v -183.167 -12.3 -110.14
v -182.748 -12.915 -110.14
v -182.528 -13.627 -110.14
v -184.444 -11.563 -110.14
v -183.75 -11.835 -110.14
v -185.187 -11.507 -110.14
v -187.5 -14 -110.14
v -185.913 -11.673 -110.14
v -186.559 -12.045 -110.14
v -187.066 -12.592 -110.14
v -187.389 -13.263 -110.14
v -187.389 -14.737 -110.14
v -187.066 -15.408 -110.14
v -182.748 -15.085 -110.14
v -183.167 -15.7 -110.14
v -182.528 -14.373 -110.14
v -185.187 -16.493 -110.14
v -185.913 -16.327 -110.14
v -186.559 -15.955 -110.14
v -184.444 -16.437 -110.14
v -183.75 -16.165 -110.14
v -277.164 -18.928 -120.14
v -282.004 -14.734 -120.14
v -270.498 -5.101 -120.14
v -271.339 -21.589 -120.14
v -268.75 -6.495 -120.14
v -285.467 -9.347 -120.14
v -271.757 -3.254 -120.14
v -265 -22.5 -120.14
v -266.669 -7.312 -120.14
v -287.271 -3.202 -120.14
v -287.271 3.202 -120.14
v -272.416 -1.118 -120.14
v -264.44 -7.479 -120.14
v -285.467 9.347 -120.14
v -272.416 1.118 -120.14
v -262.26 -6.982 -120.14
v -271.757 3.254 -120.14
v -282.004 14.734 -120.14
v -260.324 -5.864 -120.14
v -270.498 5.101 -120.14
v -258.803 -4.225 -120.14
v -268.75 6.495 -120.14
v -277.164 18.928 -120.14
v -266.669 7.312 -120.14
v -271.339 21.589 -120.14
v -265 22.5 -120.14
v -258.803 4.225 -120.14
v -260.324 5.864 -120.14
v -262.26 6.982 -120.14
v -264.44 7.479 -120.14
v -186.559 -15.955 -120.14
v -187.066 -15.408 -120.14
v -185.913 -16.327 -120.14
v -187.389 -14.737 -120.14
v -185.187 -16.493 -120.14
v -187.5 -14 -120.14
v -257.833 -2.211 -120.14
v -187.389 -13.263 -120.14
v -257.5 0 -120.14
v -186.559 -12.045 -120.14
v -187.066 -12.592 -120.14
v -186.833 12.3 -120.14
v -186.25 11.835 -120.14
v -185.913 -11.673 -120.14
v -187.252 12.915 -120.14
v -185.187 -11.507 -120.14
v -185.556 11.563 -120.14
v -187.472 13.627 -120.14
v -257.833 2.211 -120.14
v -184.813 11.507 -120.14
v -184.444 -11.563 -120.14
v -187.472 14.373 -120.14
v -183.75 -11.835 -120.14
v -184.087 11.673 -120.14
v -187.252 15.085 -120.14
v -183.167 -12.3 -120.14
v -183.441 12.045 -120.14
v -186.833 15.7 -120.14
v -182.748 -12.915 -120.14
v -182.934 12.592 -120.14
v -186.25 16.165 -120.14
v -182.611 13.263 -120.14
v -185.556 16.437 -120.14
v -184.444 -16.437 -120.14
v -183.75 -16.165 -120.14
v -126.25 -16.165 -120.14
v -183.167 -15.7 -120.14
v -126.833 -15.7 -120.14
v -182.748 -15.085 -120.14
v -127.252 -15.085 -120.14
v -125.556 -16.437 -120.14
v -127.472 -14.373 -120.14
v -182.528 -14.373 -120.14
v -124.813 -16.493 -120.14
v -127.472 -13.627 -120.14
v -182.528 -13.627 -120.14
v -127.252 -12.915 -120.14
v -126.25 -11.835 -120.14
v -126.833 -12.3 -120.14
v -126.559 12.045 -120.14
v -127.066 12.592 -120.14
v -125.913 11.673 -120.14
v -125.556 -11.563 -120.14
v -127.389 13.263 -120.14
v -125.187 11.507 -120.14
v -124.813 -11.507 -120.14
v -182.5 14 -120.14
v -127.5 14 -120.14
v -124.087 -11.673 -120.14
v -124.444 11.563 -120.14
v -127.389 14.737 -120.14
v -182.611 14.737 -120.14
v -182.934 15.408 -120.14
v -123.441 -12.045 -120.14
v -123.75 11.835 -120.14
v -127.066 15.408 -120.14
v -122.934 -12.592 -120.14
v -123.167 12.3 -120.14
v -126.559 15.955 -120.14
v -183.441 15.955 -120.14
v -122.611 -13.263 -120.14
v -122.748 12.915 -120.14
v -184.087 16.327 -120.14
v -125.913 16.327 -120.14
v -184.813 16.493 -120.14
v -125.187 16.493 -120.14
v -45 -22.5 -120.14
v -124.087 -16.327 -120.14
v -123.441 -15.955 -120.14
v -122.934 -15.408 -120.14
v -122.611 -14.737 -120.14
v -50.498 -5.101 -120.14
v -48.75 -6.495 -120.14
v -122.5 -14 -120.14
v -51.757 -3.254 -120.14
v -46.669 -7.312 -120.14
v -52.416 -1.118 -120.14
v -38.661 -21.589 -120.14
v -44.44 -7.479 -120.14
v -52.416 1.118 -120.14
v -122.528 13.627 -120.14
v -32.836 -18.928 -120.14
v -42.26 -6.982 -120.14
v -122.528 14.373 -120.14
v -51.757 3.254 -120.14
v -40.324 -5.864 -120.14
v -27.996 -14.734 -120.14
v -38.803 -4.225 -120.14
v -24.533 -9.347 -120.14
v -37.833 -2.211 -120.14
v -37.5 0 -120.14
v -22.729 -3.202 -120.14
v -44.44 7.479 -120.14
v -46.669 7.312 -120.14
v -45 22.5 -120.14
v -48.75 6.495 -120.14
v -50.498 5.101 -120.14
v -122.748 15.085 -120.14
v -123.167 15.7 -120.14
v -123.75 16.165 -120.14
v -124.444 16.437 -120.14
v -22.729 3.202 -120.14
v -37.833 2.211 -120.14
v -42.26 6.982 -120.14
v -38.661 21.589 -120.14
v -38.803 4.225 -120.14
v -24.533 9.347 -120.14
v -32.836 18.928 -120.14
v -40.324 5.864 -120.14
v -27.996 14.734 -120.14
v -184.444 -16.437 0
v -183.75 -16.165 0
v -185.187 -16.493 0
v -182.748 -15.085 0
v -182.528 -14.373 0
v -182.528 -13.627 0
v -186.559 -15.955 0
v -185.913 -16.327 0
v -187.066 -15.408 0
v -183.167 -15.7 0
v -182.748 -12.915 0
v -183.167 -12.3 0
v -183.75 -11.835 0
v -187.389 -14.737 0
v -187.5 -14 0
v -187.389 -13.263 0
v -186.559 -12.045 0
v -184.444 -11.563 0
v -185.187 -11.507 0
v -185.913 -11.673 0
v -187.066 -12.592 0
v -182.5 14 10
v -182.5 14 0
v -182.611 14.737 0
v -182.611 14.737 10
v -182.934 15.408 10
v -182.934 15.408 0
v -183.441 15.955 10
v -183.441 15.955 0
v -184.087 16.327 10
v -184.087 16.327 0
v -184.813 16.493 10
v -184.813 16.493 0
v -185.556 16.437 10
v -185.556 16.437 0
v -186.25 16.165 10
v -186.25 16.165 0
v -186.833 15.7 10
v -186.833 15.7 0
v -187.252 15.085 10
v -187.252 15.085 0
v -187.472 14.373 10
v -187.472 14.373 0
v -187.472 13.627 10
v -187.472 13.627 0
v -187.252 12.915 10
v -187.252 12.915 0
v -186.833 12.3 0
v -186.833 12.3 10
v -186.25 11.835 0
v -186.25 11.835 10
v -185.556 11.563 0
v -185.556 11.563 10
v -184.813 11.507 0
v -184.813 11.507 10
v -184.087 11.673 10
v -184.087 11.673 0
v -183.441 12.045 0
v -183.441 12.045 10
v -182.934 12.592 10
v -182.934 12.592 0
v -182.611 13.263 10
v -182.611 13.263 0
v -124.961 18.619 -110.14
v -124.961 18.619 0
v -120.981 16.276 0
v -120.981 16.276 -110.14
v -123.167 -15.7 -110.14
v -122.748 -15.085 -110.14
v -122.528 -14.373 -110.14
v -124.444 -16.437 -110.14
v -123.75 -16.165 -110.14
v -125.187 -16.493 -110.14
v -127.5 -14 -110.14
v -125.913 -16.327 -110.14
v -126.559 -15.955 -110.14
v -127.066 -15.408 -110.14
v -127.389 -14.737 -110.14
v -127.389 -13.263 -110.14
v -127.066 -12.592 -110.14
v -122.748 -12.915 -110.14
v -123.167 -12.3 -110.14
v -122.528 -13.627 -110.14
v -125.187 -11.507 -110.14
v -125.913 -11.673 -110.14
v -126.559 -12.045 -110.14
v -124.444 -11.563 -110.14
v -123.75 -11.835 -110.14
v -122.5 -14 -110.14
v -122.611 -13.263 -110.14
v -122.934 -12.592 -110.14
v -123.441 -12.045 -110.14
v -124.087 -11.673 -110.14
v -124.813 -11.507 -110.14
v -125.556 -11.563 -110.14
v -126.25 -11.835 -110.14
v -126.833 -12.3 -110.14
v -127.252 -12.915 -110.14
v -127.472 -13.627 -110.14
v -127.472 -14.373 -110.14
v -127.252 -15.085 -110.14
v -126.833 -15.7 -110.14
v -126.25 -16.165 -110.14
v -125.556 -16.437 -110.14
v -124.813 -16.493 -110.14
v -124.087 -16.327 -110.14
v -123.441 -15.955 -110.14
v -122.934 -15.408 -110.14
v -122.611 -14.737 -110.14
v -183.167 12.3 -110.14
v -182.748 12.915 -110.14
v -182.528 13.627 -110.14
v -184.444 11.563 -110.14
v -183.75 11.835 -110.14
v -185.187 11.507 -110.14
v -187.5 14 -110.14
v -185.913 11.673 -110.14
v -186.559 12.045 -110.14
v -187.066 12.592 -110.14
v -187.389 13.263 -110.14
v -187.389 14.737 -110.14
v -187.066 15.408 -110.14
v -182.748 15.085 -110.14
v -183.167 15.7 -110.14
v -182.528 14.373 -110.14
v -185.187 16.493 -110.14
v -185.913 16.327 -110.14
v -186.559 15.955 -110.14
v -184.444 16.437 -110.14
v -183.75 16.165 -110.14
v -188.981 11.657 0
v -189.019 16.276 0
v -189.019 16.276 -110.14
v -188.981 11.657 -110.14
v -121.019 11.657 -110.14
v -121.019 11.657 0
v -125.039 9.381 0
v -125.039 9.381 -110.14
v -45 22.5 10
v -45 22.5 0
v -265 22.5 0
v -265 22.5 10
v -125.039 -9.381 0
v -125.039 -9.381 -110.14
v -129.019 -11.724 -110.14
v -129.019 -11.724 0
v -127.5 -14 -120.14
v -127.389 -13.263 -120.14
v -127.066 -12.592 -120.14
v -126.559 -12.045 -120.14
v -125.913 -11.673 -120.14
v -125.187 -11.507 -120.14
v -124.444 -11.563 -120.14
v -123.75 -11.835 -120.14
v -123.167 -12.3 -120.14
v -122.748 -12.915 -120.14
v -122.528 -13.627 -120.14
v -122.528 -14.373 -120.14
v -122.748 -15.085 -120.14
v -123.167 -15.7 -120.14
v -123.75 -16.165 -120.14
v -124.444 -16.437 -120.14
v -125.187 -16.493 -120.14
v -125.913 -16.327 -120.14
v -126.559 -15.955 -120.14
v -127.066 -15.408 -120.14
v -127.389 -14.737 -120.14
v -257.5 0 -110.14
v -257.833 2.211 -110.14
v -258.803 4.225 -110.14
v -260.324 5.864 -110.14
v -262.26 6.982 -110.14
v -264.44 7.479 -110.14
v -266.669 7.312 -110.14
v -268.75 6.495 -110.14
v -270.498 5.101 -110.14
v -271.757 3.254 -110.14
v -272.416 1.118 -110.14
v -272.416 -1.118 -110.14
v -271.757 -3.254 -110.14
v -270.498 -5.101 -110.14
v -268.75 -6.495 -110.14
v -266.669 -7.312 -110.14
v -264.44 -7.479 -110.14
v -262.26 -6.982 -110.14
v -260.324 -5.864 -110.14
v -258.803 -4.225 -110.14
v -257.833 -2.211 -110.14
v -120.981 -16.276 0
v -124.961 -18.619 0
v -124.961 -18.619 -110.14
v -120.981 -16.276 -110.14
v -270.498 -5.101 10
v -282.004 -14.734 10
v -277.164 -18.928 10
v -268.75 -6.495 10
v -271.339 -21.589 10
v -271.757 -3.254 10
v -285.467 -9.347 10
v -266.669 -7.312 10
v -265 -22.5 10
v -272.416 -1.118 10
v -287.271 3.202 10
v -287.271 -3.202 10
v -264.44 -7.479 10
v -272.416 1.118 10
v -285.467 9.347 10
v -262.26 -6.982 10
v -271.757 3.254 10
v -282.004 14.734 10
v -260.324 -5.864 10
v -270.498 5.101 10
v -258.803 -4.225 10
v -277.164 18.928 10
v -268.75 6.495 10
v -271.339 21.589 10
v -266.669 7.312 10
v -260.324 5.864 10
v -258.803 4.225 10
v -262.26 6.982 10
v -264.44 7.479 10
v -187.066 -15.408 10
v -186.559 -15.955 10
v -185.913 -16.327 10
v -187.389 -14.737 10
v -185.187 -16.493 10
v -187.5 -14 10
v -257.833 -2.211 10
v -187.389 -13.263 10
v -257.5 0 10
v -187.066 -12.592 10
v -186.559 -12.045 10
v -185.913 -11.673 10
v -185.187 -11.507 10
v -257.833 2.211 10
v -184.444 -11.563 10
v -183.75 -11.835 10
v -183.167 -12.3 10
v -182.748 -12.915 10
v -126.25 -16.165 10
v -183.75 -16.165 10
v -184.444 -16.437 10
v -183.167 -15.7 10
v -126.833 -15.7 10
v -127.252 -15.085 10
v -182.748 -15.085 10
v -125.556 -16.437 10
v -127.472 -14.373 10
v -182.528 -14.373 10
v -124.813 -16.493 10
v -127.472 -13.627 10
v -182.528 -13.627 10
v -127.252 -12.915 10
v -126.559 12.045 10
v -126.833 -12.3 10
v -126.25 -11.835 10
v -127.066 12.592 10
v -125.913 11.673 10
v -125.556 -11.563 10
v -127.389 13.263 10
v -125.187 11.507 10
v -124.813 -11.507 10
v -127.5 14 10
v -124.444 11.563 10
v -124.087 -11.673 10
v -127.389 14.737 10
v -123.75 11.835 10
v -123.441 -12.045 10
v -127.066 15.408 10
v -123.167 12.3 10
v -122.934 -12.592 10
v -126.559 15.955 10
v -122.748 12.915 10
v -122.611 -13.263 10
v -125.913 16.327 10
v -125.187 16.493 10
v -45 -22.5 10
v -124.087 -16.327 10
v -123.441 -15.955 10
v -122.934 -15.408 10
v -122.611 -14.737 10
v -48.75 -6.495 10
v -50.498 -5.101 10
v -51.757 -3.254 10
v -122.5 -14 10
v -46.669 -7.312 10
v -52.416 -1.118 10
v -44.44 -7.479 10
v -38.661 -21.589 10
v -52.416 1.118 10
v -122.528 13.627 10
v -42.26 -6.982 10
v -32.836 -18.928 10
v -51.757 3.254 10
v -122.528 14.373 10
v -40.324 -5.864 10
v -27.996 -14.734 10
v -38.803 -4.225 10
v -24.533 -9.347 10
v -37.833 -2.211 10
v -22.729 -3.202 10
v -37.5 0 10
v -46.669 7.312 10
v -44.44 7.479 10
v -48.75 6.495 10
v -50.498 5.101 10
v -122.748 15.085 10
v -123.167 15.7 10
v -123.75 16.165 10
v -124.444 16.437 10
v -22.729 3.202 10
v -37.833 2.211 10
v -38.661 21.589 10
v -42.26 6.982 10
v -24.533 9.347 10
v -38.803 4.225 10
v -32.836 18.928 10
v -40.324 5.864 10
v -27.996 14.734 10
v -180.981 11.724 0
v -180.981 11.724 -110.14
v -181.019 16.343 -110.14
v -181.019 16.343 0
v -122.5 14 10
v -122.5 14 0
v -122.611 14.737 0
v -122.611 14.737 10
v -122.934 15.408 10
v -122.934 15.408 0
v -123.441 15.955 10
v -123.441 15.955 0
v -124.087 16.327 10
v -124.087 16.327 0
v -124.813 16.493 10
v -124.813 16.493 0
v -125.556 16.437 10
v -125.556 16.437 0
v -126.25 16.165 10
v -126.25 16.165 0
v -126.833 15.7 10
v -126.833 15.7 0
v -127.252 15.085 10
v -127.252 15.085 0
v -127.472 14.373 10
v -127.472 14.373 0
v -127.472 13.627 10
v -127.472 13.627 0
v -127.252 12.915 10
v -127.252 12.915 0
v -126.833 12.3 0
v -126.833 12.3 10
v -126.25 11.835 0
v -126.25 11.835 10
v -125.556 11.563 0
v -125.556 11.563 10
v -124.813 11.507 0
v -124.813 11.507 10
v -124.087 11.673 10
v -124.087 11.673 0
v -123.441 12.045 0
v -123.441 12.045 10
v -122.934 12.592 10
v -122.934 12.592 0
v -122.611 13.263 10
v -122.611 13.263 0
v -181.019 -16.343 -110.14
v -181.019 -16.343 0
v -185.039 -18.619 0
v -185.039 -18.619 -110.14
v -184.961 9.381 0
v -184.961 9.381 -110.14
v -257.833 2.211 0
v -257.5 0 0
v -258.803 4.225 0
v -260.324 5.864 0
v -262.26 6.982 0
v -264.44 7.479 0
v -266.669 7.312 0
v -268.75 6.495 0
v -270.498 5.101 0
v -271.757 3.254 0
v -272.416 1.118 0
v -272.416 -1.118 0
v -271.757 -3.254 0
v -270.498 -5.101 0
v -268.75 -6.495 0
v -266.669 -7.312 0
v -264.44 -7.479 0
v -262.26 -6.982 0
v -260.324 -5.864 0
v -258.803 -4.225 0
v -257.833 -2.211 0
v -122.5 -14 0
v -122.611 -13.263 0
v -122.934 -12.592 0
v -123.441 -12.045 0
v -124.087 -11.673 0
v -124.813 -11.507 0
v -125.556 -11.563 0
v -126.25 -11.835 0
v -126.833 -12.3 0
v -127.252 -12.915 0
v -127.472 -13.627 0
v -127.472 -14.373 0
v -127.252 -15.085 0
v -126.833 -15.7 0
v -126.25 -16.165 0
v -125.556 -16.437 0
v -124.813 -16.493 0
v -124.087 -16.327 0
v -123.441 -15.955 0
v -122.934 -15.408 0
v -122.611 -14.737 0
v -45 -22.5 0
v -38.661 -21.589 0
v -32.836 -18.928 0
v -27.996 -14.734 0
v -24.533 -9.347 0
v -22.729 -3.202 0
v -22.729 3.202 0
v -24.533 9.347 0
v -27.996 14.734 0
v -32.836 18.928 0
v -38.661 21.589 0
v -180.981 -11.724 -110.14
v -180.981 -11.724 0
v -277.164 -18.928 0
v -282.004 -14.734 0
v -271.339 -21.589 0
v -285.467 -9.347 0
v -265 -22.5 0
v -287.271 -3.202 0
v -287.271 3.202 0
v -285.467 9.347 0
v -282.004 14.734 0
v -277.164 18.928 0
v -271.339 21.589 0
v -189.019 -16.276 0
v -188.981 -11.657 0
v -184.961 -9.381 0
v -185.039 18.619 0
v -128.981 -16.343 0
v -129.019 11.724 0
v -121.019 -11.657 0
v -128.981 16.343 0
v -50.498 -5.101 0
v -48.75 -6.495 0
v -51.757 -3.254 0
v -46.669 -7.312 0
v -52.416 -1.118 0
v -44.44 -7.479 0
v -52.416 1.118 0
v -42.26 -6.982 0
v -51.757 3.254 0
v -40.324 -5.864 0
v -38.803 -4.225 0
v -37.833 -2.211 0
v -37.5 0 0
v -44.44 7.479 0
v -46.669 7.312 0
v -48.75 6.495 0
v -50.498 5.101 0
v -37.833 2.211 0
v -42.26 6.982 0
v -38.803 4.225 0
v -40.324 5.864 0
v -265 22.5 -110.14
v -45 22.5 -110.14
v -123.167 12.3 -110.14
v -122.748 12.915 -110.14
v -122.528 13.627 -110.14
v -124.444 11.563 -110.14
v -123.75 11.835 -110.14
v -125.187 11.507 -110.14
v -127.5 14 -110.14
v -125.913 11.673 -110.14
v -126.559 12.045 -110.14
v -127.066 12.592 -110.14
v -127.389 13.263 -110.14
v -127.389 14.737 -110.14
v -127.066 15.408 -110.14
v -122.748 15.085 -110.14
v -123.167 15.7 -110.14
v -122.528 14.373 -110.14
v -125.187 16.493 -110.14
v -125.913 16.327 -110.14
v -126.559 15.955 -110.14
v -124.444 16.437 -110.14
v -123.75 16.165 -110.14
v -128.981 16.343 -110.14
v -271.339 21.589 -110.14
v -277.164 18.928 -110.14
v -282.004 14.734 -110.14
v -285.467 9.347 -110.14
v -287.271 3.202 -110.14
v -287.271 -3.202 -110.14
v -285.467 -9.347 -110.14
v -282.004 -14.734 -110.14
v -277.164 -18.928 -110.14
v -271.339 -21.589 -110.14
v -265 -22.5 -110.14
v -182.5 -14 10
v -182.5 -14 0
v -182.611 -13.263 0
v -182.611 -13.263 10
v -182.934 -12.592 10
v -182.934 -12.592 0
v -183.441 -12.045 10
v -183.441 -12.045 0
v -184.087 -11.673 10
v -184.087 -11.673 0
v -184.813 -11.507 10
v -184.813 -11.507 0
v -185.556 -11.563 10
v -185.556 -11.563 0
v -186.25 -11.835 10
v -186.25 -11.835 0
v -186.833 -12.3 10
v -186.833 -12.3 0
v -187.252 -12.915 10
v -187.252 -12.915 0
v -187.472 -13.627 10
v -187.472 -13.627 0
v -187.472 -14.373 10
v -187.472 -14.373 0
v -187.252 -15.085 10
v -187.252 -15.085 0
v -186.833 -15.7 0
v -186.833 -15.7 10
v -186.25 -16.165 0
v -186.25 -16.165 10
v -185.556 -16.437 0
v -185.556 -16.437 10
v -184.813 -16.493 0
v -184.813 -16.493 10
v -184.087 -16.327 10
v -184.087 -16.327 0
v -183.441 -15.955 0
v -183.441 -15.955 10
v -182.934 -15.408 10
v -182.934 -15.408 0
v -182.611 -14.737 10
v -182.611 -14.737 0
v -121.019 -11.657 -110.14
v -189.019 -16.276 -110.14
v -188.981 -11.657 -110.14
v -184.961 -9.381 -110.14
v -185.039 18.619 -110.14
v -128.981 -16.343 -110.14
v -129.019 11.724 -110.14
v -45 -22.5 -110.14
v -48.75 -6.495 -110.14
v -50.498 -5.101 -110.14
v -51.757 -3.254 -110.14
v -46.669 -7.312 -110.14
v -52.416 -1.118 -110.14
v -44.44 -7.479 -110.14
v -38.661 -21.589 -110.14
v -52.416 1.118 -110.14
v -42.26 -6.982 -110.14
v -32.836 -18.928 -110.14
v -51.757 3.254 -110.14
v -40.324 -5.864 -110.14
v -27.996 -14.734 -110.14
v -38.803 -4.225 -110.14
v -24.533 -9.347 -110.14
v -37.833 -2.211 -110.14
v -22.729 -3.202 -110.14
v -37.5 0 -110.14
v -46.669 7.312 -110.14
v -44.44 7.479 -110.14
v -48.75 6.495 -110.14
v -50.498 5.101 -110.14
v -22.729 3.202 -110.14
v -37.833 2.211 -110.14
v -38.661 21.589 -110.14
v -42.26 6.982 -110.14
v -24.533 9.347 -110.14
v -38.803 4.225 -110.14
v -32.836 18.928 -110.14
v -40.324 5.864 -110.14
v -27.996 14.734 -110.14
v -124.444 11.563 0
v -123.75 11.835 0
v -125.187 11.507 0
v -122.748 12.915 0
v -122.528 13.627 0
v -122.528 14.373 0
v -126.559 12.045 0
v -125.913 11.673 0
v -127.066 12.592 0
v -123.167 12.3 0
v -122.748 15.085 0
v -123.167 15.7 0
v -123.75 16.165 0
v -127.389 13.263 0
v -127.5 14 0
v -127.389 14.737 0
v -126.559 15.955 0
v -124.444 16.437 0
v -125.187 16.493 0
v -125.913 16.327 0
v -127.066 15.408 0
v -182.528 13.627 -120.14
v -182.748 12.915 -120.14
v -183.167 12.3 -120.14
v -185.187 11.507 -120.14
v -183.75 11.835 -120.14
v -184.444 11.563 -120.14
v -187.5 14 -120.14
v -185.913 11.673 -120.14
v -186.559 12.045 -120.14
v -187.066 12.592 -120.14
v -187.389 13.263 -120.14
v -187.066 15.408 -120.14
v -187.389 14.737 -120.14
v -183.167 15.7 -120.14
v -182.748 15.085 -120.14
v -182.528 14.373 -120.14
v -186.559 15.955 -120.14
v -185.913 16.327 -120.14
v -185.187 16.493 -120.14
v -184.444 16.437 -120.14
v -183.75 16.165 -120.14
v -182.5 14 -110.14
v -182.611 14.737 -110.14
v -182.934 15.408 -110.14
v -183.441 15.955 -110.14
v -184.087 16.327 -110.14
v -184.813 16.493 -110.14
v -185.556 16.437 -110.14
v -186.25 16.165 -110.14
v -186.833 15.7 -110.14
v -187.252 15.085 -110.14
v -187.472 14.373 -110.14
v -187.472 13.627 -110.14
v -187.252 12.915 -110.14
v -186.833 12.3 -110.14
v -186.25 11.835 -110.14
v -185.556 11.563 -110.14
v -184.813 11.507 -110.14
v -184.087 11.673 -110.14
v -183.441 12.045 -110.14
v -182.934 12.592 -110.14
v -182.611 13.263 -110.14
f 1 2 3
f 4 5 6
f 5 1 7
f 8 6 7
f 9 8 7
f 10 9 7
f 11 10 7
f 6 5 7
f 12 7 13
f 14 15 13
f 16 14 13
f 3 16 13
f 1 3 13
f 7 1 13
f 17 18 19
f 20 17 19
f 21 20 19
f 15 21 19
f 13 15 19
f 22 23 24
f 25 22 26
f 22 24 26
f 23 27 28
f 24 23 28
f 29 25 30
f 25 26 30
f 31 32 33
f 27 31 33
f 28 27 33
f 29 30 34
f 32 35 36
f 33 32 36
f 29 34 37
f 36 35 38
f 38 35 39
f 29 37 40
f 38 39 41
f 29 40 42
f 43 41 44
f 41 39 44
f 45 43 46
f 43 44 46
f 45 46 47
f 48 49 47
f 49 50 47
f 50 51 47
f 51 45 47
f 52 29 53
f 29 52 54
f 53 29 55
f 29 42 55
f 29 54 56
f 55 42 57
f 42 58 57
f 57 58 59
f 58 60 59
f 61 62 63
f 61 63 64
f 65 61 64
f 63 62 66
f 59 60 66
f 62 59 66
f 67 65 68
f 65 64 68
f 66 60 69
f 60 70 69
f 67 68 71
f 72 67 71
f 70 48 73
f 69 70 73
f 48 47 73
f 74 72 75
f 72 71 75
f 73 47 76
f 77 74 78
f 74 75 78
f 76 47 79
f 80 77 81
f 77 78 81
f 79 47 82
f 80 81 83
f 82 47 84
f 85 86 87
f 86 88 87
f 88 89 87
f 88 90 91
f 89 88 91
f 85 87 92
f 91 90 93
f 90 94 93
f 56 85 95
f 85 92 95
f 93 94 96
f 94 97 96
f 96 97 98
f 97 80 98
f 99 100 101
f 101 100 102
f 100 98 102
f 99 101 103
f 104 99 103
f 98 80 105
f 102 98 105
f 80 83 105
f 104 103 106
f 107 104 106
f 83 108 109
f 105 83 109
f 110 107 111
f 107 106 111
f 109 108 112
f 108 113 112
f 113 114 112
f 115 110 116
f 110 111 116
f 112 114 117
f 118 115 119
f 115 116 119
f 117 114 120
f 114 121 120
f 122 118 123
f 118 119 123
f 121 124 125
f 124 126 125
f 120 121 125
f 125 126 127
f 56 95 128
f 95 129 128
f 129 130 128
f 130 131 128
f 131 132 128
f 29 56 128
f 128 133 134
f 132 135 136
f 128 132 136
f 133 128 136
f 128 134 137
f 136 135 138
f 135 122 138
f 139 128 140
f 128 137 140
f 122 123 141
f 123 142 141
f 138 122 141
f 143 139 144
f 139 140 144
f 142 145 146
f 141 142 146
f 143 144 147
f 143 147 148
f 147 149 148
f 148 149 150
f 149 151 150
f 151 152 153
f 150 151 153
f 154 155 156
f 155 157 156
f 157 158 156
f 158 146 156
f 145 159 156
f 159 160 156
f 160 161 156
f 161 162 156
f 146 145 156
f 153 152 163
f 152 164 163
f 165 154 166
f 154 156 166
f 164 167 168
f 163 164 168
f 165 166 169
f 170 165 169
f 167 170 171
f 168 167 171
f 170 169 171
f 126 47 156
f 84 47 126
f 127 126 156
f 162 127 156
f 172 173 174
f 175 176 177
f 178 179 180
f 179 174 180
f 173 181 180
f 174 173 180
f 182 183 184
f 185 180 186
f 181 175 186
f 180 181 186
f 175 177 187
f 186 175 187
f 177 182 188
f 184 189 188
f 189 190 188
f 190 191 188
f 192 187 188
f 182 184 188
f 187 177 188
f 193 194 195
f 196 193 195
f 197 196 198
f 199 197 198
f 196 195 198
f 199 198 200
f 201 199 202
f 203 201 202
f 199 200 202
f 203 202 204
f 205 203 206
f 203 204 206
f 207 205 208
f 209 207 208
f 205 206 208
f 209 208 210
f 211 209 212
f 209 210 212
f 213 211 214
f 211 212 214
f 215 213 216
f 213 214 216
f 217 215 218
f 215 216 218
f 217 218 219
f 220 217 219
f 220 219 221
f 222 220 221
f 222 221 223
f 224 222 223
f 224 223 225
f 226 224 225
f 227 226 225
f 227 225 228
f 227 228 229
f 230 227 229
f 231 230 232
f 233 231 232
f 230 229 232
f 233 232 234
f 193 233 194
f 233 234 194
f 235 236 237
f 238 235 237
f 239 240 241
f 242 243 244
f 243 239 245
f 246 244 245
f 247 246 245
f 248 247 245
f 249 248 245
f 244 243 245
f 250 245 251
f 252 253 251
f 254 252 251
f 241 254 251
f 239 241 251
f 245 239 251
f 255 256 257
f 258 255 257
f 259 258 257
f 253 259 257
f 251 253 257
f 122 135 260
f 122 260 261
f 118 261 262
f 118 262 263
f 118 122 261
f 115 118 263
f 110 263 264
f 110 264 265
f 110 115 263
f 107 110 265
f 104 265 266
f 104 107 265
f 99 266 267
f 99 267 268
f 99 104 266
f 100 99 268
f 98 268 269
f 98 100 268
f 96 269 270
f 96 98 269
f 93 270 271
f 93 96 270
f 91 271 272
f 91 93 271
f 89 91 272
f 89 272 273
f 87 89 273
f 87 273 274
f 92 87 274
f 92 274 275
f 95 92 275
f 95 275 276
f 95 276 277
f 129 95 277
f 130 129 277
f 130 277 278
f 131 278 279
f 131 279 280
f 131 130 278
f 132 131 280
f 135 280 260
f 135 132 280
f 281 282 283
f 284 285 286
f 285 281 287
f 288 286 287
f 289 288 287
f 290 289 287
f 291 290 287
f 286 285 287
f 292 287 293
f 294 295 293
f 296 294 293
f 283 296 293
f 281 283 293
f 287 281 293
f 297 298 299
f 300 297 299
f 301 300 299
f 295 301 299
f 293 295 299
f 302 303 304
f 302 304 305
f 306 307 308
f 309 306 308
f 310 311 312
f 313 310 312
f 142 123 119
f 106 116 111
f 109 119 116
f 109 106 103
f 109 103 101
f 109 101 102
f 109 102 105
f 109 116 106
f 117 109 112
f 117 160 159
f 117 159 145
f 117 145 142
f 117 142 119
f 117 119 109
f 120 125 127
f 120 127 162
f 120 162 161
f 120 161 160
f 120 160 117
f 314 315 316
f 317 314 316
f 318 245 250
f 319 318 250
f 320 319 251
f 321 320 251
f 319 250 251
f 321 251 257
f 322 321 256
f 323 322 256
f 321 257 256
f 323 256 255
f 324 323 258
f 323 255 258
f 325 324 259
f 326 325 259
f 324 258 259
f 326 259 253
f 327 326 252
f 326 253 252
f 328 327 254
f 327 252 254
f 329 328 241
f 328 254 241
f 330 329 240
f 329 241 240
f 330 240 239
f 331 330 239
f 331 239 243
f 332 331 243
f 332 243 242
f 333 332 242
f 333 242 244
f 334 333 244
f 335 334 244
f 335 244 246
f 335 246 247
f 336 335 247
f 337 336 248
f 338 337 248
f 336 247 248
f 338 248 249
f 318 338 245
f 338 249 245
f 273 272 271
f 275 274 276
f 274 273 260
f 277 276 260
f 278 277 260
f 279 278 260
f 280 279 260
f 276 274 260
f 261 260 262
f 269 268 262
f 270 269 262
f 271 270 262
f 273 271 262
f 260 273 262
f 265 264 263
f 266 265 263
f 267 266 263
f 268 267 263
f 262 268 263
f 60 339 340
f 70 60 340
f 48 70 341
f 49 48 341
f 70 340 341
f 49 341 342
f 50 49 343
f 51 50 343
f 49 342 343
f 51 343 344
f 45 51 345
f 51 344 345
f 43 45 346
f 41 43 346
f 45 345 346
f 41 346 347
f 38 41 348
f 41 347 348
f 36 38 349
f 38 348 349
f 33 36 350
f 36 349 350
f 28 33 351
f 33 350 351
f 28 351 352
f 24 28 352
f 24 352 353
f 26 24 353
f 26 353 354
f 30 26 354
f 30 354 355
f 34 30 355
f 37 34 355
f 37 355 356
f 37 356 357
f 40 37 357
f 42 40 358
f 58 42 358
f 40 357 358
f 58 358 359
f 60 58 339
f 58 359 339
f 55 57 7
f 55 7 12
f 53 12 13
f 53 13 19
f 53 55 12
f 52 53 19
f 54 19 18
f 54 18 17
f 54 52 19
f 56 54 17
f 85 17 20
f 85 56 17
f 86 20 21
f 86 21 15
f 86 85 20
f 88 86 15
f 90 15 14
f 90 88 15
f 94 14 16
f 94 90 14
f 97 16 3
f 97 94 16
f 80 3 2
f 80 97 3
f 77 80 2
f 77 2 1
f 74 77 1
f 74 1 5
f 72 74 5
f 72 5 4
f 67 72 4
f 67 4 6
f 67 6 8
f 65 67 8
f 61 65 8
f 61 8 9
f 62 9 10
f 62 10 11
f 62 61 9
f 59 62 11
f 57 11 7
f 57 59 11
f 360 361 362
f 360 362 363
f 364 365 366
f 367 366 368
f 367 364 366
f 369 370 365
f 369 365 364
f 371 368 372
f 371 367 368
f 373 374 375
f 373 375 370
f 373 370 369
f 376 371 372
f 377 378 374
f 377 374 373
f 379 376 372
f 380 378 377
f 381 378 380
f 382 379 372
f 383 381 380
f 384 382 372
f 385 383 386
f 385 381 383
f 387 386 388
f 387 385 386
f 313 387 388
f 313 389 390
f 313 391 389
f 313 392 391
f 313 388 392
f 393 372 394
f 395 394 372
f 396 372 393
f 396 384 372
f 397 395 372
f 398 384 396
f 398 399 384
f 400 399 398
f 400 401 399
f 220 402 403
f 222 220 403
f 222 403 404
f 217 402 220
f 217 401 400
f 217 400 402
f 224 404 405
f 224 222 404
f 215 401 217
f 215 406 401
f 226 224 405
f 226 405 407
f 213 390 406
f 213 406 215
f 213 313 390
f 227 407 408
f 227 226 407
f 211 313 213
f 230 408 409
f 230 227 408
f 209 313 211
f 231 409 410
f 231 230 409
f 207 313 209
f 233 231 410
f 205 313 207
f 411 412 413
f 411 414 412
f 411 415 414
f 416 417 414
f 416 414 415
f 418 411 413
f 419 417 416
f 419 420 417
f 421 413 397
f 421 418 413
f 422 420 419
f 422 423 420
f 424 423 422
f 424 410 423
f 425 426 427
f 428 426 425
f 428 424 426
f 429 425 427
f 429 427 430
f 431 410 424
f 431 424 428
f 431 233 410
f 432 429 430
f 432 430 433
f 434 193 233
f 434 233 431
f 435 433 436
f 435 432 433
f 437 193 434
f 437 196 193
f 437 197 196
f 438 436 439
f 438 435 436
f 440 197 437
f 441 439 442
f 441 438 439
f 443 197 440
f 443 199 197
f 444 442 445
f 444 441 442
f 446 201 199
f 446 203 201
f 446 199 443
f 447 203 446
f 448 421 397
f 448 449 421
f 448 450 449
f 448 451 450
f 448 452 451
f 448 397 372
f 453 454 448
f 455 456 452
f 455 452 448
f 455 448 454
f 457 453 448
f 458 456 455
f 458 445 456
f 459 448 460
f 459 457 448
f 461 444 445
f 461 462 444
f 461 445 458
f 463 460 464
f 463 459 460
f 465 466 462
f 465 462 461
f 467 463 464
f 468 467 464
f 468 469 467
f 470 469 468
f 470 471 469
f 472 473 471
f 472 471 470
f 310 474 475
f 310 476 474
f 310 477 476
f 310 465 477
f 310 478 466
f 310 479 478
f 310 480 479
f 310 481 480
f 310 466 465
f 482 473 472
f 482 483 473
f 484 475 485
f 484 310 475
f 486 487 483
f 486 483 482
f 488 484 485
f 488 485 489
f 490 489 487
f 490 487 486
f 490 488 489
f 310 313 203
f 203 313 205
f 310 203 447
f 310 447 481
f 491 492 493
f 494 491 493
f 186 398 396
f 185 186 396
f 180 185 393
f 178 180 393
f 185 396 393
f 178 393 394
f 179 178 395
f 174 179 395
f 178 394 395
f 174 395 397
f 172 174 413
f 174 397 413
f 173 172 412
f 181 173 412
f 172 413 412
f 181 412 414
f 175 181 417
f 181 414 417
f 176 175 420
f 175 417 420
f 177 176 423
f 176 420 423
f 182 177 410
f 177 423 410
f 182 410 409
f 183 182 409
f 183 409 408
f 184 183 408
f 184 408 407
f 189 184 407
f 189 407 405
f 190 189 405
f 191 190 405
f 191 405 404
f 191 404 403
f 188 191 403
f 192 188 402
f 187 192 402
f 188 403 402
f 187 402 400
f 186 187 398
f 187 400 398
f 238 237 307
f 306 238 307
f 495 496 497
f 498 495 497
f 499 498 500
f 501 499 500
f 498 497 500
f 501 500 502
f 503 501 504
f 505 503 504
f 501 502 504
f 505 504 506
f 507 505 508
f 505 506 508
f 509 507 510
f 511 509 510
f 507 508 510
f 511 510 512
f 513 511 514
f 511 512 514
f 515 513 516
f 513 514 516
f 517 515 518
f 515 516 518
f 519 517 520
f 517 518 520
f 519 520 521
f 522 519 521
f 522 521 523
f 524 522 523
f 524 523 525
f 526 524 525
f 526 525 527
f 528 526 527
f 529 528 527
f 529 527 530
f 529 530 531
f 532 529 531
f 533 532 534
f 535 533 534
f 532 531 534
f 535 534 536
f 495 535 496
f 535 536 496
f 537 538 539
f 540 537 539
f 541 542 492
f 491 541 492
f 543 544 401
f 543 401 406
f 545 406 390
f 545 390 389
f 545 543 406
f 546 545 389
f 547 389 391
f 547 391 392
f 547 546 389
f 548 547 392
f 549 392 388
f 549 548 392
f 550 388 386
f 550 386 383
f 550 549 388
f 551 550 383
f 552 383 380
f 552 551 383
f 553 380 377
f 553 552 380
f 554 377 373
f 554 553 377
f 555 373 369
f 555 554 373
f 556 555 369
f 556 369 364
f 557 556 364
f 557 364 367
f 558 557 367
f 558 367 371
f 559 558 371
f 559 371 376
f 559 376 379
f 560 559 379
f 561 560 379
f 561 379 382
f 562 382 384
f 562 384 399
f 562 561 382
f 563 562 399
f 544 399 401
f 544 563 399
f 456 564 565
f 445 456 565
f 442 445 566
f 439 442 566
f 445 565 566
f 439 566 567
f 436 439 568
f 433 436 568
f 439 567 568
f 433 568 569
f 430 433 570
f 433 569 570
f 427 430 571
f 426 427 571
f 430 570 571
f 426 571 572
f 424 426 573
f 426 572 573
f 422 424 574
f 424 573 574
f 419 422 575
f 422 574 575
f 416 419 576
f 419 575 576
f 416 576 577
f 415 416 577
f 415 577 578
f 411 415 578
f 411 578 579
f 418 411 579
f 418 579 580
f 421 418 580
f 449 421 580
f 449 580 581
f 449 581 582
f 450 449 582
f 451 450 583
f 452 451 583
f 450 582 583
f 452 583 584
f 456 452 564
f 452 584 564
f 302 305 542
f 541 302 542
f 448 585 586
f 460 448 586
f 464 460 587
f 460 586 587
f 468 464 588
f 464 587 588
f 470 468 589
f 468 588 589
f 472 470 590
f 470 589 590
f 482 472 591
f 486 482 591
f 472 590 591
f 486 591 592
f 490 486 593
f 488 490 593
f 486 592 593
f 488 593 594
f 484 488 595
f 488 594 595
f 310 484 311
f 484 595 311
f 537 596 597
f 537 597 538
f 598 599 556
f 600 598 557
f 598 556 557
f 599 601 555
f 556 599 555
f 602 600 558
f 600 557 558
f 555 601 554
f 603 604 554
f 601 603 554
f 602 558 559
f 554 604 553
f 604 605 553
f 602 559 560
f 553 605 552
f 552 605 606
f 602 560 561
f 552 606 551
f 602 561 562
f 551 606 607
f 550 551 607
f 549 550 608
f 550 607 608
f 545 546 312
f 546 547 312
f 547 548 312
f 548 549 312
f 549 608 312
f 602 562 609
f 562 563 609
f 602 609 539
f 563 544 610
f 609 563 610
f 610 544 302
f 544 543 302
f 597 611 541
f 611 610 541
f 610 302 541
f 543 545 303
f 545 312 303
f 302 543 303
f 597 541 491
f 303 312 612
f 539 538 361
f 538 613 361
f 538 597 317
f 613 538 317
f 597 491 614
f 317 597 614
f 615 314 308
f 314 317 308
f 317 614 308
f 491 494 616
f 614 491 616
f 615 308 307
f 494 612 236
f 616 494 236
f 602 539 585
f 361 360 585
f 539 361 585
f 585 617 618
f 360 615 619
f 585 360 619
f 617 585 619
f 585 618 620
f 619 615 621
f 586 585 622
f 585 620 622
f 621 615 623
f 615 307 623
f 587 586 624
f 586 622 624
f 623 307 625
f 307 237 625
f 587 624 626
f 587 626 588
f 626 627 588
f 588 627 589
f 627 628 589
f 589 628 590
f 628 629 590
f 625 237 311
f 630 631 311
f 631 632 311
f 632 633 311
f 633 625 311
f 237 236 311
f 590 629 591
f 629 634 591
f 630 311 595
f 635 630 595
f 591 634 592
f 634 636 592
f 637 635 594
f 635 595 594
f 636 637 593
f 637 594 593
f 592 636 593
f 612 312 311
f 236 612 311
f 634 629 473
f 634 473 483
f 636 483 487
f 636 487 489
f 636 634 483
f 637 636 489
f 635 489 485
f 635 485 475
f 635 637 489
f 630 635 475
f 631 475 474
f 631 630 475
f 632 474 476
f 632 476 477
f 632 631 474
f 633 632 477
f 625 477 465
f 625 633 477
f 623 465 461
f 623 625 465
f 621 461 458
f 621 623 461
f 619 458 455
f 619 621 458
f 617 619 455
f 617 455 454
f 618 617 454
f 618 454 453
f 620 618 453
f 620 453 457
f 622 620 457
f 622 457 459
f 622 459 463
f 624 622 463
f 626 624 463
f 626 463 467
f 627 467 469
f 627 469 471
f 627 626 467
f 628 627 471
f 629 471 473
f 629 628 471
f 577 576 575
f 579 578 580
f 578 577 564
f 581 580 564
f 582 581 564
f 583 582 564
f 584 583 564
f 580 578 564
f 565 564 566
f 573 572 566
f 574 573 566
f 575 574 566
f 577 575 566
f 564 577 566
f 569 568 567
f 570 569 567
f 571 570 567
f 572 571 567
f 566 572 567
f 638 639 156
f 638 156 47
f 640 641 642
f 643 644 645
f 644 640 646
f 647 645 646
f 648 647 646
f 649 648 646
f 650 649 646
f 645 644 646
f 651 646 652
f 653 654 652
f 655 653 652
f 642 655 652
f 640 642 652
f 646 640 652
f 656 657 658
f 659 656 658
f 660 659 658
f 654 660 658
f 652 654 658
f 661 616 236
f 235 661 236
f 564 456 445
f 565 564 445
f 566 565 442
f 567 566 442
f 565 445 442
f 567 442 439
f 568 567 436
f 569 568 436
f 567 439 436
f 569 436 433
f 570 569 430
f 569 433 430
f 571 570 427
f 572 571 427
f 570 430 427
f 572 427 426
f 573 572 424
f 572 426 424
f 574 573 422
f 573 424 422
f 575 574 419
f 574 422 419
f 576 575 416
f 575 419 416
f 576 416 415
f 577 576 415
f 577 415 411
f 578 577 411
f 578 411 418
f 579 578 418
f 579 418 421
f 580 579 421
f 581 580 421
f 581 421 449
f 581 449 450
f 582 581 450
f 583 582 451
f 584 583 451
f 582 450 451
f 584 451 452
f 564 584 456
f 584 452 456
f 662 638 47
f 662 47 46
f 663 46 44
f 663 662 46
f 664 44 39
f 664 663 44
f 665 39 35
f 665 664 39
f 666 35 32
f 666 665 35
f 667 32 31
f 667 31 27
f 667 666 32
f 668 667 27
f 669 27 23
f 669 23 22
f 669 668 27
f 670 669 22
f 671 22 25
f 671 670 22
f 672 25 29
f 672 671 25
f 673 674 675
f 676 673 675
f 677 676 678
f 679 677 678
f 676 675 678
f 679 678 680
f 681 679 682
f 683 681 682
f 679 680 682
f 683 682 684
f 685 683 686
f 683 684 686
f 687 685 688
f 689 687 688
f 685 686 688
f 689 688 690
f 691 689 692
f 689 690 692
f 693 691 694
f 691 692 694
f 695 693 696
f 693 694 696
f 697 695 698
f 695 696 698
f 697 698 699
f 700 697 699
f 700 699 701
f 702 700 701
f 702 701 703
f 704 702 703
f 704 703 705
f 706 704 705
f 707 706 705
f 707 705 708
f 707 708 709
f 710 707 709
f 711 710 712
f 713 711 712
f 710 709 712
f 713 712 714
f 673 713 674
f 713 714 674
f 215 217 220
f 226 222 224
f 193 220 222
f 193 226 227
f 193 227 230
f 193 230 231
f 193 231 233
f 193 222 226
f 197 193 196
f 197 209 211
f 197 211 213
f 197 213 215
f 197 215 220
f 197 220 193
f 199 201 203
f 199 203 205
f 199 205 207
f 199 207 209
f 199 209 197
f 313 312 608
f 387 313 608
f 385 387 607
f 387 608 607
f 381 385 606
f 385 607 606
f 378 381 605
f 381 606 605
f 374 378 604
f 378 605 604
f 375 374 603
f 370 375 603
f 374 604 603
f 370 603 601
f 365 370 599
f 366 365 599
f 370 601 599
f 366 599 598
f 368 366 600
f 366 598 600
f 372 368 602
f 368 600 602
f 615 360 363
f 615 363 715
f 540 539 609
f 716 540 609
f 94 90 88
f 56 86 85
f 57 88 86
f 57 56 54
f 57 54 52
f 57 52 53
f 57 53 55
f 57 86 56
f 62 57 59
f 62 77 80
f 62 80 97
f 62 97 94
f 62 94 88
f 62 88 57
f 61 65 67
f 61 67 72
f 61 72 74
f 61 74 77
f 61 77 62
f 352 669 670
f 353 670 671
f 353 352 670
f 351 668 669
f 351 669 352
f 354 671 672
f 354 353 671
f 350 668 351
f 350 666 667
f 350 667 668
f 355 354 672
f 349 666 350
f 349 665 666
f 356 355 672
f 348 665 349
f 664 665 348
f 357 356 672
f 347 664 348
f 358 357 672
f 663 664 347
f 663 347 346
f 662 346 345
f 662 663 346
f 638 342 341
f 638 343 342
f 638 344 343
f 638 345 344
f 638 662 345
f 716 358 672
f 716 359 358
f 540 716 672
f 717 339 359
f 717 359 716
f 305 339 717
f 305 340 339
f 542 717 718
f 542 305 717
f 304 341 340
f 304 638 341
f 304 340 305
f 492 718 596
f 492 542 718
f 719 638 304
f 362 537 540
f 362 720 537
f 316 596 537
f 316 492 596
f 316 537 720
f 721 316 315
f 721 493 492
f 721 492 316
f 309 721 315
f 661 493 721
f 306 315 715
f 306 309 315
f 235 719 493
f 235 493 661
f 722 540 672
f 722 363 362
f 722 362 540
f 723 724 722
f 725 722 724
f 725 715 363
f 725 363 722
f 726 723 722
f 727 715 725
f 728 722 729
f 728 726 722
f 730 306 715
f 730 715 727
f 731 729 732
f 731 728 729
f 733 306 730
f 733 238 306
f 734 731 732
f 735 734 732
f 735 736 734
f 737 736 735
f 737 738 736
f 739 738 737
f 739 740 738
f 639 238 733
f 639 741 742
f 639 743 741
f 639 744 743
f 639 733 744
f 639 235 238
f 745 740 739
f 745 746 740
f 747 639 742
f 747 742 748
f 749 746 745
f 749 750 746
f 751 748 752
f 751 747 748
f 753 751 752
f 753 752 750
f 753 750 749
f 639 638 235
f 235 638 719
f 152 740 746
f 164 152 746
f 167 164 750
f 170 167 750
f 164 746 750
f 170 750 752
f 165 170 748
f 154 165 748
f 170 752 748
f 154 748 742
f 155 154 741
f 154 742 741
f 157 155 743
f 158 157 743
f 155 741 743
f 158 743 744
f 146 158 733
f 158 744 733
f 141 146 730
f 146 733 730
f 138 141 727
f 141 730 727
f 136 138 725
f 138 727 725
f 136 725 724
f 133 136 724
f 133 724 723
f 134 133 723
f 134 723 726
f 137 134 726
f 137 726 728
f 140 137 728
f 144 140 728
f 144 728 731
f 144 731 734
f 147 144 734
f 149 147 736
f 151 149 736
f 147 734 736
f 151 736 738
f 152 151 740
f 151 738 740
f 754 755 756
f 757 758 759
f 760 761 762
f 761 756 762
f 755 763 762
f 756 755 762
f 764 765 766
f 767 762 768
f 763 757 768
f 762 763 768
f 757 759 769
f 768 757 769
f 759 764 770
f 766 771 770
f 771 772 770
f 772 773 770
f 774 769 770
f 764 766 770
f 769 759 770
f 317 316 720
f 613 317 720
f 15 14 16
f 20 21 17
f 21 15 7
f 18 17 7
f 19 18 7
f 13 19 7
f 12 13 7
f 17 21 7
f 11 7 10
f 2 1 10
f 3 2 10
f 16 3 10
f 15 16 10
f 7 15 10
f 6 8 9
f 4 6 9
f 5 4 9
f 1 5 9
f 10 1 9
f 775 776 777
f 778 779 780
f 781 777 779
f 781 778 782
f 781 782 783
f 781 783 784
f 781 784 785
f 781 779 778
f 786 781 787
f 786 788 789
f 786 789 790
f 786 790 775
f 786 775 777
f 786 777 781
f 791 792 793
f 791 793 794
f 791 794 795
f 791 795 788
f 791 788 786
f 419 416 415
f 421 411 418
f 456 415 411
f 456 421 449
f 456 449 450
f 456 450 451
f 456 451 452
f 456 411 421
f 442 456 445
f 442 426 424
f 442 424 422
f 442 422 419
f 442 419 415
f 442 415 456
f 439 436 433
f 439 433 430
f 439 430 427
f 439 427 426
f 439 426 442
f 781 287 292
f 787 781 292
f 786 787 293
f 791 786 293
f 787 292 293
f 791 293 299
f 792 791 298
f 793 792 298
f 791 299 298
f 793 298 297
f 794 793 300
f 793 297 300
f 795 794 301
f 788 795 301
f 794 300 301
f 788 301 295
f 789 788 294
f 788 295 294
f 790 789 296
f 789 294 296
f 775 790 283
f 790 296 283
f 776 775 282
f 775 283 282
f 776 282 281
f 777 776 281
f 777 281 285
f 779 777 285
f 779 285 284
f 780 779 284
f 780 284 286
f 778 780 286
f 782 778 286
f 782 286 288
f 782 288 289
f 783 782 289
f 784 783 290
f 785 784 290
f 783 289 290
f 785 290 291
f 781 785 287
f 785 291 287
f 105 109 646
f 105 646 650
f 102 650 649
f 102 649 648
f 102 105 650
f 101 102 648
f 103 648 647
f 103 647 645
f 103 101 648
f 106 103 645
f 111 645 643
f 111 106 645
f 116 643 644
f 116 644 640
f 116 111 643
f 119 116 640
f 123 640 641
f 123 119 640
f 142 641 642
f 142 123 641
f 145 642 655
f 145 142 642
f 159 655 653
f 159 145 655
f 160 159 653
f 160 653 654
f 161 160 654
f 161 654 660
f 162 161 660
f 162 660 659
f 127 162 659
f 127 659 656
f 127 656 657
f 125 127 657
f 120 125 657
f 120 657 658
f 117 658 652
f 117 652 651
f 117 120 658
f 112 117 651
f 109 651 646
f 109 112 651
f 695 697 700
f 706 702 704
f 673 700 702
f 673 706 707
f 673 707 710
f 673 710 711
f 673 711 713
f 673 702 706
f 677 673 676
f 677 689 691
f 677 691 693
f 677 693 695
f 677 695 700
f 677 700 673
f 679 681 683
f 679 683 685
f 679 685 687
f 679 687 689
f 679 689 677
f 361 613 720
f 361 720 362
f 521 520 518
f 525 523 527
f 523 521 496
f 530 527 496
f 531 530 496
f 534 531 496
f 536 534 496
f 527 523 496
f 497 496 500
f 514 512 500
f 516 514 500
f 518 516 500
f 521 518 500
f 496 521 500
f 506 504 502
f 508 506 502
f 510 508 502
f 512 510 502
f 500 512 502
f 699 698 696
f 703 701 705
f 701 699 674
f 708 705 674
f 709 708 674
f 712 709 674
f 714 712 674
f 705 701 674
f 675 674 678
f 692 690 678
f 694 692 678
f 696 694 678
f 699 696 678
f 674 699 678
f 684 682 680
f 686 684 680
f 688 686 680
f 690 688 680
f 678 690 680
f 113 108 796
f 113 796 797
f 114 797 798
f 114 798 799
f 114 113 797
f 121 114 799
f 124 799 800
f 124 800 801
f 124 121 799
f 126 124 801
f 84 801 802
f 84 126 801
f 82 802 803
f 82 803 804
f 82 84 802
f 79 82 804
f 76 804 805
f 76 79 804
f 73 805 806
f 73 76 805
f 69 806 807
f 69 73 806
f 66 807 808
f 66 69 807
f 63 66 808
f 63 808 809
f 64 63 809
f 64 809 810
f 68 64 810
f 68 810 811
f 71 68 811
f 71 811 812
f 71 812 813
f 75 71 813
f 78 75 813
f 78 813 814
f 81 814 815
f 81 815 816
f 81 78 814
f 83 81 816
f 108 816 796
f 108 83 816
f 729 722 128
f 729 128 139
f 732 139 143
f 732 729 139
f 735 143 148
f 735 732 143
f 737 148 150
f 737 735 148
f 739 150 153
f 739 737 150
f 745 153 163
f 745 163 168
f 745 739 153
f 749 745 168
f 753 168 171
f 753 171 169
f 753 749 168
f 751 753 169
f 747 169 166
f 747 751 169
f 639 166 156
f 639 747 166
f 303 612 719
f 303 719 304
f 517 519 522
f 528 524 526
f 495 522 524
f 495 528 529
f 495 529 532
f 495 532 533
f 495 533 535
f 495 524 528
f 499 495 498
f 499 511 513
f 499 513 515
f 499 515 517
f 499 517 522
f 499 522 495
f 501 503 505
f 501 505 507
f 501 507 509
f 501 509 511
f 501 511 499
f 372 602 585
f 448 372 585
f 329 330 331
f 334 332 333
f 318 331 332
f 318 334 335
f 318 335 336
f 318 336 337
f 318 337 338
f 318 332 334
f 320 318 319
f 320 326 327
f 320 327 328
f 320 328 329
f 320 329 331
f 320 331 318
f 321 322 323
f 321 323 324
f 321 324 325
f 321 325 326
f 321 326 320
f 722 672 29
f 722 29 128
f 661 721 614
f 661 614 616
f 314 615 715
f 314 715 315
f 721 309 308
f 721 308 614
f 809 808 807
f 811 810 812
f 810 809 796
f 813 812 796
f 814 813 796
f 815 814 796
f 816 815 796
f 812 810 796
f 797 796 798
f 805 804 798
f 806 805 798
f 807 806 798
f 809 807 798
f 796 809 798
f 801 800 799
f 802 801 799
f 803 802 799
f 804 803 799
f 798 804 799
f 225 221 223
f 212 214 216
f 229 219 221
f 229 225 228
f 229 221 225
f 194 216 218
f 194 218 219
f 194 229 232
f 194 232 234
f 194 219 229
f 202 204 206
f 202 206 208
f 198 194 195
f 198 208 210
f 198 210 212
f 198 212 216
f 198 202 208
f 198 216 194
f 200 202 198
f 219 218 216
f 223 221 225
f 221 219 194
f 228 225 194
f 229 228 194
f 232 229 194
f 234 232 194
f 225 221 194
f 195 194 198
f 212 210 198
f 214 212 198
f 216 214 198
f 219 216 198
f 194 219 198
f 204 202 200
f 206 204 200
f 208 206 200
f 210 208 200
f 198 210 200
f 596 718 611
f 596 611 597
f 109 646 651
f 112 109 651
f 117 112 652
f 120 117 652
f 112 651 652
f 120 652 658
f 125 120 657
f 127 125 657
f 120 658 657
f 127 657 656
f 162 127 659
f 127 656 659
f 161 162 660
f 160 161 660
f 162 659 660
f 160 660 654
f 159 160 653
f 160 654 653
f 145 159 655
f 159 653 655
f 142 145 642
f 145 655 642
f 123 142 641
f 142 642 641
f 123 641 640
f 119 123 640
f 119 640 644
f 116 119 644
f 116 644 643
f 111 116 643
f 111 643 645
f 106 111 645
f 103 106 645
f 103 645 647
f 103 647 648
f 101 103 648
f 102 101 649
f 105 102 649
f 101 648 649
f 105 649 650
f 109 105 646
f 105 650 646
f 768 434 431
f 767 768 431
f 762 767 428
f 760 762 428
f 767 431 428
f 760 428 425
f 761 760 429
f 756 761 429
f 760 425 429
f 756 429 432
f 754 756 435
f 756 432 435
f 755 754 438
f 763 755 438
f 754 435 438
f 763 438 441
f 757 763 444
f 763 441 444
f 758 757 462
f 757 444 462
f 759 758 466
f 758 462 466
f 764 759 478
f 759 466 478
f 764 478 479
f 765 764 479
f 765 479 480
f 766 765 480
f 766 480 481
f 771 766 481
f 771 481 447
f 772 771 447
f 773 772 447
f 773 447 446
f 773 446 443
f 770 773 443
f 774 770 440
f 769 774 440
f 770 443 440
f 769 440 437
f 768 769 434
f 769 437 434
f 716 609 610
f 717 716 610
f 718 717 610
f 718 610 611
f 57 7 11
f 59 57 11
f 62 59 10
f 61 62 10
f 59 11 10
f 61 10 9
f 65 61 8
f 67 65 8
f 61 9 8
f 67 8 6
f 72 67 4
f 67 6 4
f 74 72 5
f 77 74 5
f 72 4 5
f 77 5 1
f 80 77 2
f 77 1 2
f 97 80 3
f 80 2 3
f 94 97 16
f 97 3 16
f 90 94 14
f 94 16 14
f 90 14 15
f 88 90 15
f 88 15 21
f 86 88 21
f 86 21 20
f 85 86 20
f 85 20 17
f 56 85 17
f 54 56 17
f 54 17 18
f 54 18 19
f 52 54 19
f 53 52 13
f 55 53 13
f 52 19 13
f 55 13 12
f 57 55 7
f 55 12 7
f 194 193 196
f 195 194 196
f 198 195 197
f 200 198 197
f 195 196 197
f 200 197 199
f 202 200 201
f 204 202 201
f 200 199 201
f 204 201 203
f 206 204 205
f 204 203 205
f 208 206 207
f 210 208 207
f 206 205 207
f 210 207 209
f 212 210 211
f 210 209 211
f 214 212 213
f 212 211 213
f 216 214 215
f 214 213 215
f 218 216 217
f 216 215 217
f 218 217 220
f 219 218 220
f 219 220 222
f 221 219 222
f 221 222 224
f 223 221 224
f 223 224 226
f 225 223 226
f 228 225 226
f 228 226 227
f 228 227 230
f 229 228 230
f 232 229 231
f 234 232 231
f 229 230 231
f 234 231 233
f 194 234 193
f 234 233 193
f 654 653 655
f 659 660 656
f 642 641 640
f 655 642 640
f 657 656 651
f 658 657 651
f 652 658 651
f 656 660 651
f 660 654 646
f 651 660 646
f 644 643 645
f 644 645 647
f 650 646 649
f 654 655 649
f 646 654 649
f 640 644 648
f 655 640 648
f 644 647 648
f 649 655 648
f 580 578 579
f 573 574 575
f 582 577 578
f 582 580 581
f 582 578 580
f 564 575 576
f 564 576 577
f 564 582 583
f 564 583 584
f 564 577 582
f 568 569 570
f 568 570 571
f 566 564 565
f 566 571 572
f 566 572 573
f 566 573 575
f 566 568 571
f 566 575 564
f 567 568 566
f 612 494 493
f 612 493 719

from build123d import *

# Parameters (mm, degrees)
SKETCH1_R             = 7.5
BOSS_EXTRUDE1_DEPTH   = 10
SKETCH2_R             = 2.5
CUT_EXTRUDE1_DEPTH    = 10
BOSS_EXTRUDE3_DEPTH   = 120.14
SKETCH5_R             = 2.5
BOSS_EXTRUDE4_DEPTH   = 10
BOSS_EXTRUDE4_2_DEPTH = 10
BOSS_EXTRUDE4_3_DEPTH = 10
BOSS_EXTRUDE4_4_DEPTH = 10
SKETCH6_R             = 2.5
BOSS_EXTRUDE6_DEPTH   = 10
BOSS_EXTRUDE6_2_DEPTH = 10
BOSS_EXTRUDE6_3_DEPTH = 10
BOSS_EXTRUDE6_4_DEPTH = 10


with BuildPart() as part:
    # Sketch1 → Boss-Extrude1 (new body)
    with BuildSketch(Plane.XY):
        with BuildLine():
            Line((-45, 22.5), (-265, 22.5))
            ThreePointArc((-265, 22.5), (-287.5, 0), (-265, -22.5))
            Line((-265, -22.5), (-45, -22.5))
            ThreePointArc((-45, -22.5), (-22.5, 0), (-45, 22.5))
        make_face()
        with Locations((-45, 0)):
            Circle(SKETCH1_R, mode=Mode.SUBTRACT)
        with Locations((-265, 0)):
            Circle(SKETCH1_R, mode=Mode.SUBTRACT)
    boss_extrude1 = extrude(amount=BOSS_EXTRUDE1_DEPTH)

    # Sketch2 → Cut-Extrude1 (cut)
    with BuildSketch(Plane.XY.offset(10)):
        with Locations((-185, 14)):
            Circle(SKETCH2_R)
        with Locations(Location((-125, 14, 0), (0, 0, 180))):
            Circle(SKETCH2_R)
        with Locations(Location((-185, -14, 0), (0, 0, 180))):
            Circle(SKETCH2_R)
        with Locations((-125, -14)):
            Circle(SKETCH2_R)
    cut_extrude1 = extrude(amount=-CUT_EXTRUDE1_DEPTH, mode=Mode.SUBTRACT)

    # Sketch4 → Boss-Extrude3 (add)
    with BuildSketch(Plane(origin=(0, 0, 0), x_dir=(-1, 0, 0), z_dir=(0, 0, -1))):
        Polygon((129.019187659, 11.724156444), (128.980532164, 16.342796837), (124.961344505, 18.618640394), (120.980812341, 16.275843556), (121.019467836, 11.657203163), (125.038655495, 9.381359606), align=None)
        Polygon((184.961344505, 9.381359606), (180.980812341, 11.724156444), (181.019467836, 16.342796837), (185.038655495, 18.618640394), (189.019187659, 16.275843556), (188.980532164, 11.657203163), align=None)
        Polygon((121.019467836, -11.657203163), (125.038655495, -9.381359606), (129.019187659, -11.724156444), (128.980532164, -16.342796837), (124.961344505, -18.618640394), (120.980812341, -16.275843556), align=None)
        Polygon((180.980812341, -11.724156444), (181.019467836, -16.342796837), (185.038655495, -18.618640394), (189.019187659, -16.275843556), (188.980532164, -11.657203163), (184.961344505, -9.381359606), align=None)
    extrude(amount=BOSS_EXTRUDE3_DEPTH)

    # Mirror6: Boss-Extrude1, Cut-Extrude1 across plane
    add(boss_extrude1.mirror(Plane(origin=(0, 0, -55.07), x_dir=(1, 0, 0), z_dir=(0, 0, -1))))
    add(cut_extrude1.mirror(Plane(origin=(0, 0, -55.07), x_dir=(1, 0, 0), z_dir=(0, 0, -1))), mode=Mode.SUBTRACT)


with BuildPart() as body_2:
    # Sketch5 → Boss-Extrude4 (new body)
    with BuildSketch(Plane.XY):
        with Locations((-125, 14)):
            Circle(SKETCH5_R)
    extrude(amount=BOSS_EXTRUDE4_DEPTH)


with BuildPart() as body_3:
    # Sketch5 → Boss-Extrude4 2 (new body)
    with BuildSketch(Plane.XY):
        with Locations((-185, 14)):
            Circle(SKETCH5_R)
    extrude(amount=BOSS_EXTRUDE4_2_DEPTH)


with BuildPart() as body_4:
    # Sketch5 → Boss-Extrude4 3 (new body)
    with BuildSketch(Plane.XY):
        with Locations((-125, -14)):
            Circle(SKETCH5_R)
    extrude(amount=BOSS_EXTRUDE4_3_DEPTH)


with BuildPart() as body_5:
    # Sketch5 → Boss-Extrude4 4 (new body)
    with BuildSketch(Plane.XY):
        with Locations((-185, -14)):
            Circle(SKETCH5_R)
    extrude(amount=BOSS_EXTRUDE4_4_DEPTH)


with BuildPart() as body_6:
    # Sketch6 → Boss-Extrude6 (new body)
    with BuildSketch(Plane(origin=(0, 0, -110.14), x_dir=(-1, 0, 0), z_dir=(0, 0, -1))):
        with Locations((185, -14)):
            Circle(SKETCH6_R)
    extrude(amount=BOSS_EXTRUDE6_DEPTH)


with BuildPart() as body_7:
    # Sketch6 → Boss-Extrude6 2 (new body)
    with BuildSketch(Plane(origin=(0, 0, -110.14), x_dir=(-1, 0, 0), z_dir=(0, 0, -1))):
        with Locations((185, 14)):
            Circle(SKETCH6_R)
    extrude(amount=BOSS_EXTRUDE6_2_DEPTH)


with BuildPart() as body_8:
    # Sketch6 → Boss-Extrude6 3 (new body)
    with BuildSketch(Plane(origin=(0, 0, -110.14), x_dir=(-1, 0, 0), z_dir=(0, 0, -1))):
        with Locations((125, 14)):
            Circle(SKETCH6_R)
    extrude(amount=BOSS_EXTRUDE6_3_DEPTH)


with BuildPart() as body_9:
    # Sketch6 → Boss-Extrude6 4 (new body)
    with BuildSketch(Plane(origin=(0, 0, -110.14), x_dir=(-1, 0, 0), z_dir=(0, 0, -1))):
        with Locations((125, -14)):
            Circle(SKETCH6_R)
    extrude(amount=BOSS_EXTRUDE6_4_DEPTH)


solid = Compound([part.part, body_2.part, body_3.part, body_4.part, body_5.part, body_6.part, body_7.part, body_8.part, body_9.part])
